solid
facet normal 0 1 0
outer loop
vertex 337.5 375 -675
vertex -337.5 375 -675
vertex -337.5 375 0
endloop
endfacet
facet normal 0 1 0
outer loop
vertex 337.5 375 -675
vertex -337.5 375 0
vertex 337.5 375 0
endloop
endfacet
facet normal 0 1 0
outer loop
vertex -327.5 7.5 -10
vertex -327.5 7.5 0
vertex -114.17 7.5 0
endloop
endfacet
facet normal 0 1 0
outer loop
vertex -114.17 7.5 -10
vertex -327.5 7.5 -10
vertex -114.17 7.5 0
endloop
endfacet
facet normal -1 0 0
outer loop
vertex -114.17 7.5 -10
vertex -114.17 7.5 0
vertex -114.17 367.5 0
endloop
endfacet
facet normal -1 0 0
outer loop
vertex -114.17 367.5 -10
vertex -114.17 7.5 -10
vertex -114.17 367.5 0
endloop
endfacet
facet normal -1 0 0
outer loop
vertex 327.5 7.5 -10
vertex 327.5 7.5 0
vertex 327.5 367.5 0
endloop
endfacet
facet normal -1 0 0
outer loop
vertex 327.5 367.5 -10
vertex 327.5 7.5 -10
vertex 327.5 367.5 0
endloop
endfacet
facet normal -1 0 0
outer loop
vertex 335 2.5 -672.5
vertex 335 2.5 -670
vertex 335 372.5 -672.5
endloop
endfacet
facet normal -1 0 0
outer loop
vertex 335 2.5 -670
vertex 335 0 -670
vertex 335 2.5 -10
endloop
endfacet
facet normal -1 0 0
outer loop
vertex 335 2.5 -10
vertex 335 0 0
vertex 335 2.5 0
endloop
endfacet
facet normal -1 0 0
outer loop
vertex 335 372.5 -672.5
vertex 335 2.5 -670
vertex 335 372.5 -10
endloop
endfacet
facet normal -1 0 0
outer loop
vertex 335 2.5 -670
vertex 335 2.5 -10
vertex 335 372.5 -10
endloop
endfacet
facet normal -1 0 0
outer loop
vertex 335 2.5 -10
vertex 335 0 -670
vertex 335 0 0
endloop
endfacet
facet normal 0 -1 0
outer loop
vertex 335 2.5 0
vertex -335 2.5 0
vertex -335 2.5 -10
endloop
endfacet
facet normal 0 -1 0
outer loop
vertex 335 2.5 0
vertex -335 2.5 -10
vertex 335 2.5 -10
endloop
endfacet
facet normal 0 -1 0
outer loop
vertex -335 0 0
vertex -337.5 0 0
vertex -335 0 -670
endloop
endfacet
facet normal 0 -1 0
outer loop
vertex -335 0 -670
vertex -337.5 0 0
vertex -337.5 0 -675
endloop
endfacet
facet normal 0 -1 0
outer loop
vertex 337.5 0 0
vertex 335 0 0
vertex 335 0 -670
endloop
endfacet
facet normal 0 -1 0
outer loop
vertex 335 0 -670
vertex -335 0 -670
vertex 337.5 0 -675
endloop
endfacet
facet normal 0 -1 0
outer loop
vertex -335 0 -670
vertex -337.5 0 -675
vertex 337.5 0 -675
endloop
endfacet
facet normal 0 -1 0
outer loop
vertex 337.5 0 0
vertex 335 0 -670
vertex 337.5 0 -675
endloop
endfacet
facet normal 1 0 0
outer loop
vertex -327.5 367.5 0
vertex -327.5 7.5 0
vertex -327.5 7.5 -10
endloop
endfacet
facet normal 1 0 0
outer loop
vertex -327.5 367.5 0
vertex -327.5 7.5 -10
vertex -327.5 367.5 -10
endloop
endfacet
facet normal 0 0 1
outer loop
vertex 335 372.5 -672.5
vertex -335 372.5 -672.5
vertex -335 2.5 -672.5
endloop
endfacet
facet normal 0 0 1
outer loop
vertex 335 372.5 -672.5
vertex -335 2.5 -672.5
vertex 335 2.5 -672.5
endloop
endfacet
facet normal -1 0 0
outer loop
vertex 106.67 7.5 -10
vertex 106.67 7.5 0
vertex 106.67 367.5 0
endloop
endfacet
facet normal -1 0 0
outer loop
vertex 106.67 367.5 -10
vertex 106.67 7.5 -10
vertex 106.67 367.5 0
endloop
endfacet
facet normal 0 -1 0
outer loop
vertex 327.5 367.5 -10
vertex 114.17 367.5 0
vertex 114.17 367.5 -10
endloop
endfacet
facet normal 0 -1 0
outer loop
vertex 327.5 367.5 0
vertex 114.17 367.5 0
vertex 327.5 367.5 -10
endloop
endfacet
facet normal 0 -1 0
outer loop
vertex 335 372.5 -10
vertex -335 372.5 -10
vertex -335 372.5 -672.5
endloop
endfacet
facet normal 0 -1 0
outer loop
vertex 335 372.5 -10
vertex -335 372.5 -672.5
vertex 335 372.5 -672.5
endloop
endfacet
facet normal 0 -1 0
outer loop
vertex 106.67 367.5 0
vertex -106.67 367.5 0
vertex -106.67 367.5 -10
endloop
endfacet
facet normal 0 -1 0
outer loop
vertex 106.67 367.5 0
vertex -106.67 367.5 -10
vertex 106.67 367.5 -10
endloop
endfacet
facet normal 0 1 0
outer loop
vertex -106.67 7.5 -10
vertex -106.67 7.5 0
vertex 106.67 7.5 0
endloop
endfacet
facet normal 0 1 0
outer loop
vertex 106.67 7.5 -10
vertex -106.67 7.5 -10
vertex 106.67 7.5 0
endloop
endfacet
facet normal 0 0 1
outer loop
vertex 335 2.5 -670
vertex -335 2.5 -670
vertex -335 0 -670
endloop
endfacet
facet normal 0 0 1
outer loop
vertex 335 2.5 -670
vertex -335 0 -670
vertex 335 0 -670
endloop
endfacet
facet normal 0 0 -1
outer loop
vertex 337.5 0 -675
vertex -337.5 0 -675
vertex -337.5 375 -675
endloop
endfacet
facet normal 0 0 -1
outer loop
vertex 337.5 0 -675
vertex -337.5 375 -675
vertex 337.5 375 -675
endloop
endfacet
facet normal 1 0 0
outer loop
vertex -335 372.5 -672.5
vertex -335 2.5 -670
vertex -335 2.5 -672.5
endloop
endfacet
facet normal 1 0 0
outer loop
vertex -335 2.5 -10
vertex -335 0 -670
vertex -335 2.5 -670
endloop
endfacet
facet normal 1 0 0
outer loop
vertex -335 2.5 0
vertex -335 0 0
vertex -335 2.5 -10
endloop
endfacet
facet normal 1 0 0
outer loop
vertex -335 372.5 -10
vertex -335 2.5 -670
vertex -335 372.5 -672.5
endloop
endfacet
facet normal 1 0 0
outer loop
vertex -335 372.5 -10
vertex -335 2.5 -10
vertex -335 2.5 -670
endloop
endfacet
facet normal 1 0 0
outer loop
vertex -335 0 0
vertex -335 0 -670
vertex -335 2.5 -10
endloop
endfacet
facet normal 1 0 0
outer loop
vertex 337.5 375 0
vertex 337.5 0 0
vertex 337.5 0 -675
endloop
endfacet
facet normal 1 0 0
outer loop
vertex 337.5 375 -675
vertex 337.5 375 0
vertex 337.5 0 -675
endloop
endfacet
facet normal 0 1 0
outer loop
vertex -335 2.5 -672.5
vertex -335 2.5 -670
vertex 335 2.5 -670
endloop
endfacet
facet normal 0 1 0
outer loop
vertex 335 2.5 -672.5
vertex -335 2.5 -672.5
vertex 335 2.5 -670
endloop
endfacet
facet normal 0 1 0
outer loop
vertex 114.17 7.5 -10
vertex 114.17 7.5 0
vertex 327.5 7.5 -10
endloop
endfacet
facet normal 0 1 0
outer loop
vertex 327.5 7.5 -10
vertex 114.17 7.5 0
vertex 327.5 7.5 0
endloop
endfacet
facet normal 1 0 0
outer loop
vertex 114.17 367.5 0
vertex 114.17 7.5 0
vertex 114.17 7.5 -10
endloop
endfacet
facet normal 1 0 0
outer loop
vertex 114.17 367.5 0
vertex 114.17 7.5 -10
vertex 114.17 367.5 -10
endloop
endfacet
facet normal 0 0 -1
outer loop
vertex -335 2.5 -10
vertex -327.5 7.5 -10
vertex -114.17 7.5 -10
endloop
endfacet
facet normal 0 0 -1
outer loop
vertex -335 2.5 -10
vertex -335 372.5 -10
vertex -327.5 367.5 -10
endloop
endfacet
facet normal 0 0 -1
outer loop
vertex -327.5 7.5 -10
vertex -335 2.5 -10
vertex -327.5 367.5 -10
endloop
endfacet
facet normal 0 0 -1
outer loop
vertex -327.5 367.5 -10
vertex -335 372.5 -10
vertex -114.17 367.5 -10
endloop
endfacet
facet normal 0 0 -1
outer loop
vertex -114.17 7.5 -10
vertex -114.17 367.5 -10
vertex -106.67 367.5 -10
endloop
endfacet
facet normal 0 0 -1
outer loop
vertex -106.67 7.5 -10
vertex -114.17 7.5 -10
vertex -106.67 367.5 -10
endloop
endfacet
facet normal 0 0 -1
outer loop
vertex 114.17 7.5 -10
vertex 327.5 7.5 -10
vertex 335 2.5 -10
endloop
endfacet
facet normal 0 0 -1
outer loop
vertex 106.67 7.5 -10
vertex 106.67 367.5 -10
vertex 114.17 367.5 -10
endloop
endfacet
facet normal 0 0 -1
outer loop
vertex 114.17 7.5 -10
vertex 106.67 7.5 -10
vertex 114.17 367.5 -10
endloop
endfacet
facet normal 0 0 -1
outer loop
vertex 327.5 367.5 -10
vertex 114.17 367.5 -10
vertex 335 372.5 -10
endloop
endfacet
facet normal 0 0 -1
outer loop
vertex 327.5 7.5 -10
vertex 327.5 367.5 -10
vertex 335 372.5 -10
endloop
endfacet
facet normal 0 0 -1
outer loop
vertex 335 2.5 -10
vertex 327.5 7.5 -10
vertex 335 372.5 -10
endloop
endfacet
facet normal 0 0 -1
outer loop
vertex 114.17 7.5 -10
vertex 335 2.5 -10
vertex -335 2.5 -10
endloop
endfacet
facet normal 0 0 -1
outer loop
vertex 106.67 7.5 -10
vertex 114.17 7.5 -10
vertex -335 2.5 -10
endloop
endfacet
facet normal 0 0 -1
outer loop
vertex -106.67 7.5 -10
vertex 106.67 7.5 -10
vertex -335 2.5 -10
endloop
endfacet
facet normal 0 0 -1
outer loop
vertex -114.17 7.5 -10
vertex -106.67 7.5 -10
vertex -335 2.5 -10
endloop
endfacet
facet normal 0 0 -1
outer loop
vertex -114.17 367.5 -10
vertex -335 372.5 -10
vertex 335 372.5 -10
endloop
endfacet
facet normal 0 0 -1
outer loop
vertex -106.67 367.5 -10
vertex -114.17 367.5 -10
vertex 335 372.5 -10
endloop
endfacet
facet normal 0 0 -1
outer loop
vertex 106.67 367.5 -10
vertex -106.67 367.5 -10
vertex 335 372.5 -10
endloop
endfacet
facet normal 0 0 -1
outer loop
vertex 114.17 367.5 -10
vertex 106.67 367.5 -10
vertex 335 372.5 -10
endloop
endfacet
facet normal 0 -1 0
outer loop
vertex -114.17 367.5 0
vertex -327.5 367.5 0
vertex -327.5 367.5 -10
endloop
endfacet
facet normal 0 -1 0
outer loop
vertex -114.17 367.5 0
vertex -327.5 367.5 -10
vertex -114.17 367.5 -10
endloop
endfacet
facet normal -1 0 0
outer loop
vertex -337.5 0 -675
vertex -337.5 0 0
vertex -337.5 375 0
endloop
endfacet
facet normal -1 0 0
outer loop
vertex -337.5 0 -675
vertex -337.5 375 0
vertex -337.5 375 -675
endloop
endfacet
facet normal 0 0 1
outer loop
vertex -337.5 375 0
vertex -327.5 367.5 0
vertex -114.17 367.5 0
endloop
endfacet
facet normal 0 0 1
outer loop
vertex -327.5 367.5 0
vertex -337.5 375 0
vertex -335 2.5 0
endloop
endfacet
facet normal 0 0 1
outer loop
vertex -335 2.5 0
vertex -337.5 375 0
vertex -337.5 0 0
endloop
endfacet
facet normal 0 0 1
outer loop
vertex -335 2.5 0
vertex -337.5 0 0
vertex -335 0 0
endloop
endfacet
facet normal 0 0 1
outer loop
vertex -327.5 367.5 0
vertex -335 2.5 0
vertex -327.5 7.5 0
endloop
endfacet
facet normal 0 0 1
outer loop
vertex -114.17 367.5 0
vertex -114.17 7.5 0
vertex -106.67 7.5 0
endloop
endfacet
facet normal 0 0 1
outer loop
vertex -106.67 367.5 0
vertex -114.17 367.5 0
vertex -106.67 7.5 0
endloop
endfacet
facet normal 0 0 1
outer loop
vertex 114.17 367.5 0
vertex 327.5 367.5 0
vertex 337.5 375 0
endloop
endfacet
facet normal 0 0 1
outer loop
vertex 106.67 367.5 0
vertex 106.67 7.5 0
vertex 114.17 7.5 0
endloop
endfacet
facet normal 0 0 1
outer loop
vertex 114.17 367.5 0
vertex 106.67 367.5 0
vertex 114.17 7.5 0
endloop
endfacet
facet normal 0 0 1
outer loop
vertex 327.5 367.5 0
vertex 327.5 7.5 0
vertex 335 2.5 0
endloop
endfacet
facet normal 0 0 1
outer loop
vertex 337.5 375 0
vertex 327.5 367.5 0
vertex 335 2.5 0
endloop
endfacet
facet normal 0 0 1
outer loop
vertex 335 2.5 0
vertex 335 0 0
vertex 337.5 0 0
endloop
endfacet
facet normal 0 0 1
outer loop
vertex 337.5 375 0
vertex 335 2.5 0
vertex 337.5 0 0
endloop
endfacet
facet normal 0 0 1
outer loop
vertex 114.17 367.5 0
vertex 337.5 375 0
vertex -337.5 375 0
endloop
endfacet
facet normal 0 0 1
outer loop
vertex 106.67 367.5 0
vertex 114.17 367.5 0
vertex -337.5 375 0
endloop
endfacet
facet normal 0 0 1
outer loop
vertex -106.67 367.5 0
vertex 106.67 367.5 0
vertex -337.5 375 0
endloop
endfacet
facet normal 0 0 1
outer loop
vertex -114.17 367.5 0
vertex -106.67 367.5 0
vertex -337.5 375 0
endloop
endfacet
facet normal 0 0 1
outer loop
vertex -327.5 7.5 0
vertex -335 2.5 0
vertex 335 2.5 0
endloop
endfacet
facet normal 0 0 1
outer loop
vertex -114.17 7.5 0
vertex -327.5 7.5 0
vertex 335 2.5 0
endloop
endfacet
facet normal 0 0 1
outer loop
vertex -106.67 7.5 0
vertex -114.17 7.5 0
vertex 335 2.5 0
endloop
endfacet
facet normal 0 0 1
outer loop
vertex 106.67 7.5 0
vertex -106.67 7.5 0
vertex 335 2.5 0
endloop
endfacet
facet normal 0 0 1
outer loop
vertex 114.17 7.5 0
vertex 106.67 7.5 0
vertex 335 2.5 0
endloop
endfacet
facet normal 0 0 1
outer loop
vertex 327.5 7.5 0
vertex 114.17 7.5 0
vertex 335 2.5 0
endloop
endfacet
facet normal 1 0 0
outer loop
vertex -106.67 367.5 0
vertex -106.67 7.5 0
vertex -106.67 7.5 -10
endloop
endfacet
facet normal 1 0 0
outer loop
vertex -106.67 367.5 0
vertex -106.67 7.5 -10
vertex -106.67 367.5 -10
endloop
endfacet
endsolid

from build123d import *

# Parameters (mm, degrees)
SKETCH1_W           = 675
SKETCH1_H           = 675
BOSS_EXTRUDE1_DEPTH = 375
CUT_EXTRUDE3_START  = -10
SKETCH4_W           = 670
SKETCH4_H           = 370
CUT_EXTRUDE3_DEPTH  = 662.5
SKETCH6_W           = 670
SKETCH6_H           = 5
CUT_EXTRUDE4_DEPTH  = 670
SKETCH11_W          = 213.34
SKETCH11_H          = 360
SKETCH11_W_2        = 213.33
CUT_EXTRUDE6_DEPTH  = 10


with BuildPart() as part:
    # Sketch1 → Boss-Extrude1 (new body)
    with BuildSketch(Plane(origin=(0, 0, 0), x_dir=(1, 0, 0), z_dir=(0, 1, 0))):
        with Locations((0, 337.5)):
            Rectangle(SKETCH1_W, SKETCH1_H)
    extrude(amount=BOSS_EXTRUDE1_DEPTH)

    # Sketch4 → Cut-Extrude3 (cut)
    with BuildSketch(Plane.XY.offset(CUT_EXTRUDE3_START)):
        with Locations((0, 187.5)):
            Rectangle(SKETCH4_W, SKETCH4_H)
    extrude(amount=-CUT_EXTRUDE3_DEPTH, mode=Mode.SUBTRACT)

    # Sketch6 → Cut-Extrude4 (cut)
    with BuildSketch(Plane.XY):
        Rectangle(SKETCH6_W, SKETCH6_H)
    extrude(amount=-CUT_EXTRUDE4_DEPTH, mode=Mode.SUBTRACT)

    # Sketch11 → Cut-Extrude6 (cut)
    with BuildSketch(Plane.XY):
        with Locations((0, 187.5)):
            Rectangle(SKETCH11_W, SKETCH11_H)
        with Locations((-220.835, 187.5)):
            Rectangle(SKETCH11_W_2, SKETCH11_H)
        with Locations((220.835, 187.5)):
            Rectangle(SKETCH11_W_2, SKETCH11_H)
    extrude(amount=-CUT_EXTRUDE6_DEPTH, mode=Mode.SUBTRACT)


solid = part.part
